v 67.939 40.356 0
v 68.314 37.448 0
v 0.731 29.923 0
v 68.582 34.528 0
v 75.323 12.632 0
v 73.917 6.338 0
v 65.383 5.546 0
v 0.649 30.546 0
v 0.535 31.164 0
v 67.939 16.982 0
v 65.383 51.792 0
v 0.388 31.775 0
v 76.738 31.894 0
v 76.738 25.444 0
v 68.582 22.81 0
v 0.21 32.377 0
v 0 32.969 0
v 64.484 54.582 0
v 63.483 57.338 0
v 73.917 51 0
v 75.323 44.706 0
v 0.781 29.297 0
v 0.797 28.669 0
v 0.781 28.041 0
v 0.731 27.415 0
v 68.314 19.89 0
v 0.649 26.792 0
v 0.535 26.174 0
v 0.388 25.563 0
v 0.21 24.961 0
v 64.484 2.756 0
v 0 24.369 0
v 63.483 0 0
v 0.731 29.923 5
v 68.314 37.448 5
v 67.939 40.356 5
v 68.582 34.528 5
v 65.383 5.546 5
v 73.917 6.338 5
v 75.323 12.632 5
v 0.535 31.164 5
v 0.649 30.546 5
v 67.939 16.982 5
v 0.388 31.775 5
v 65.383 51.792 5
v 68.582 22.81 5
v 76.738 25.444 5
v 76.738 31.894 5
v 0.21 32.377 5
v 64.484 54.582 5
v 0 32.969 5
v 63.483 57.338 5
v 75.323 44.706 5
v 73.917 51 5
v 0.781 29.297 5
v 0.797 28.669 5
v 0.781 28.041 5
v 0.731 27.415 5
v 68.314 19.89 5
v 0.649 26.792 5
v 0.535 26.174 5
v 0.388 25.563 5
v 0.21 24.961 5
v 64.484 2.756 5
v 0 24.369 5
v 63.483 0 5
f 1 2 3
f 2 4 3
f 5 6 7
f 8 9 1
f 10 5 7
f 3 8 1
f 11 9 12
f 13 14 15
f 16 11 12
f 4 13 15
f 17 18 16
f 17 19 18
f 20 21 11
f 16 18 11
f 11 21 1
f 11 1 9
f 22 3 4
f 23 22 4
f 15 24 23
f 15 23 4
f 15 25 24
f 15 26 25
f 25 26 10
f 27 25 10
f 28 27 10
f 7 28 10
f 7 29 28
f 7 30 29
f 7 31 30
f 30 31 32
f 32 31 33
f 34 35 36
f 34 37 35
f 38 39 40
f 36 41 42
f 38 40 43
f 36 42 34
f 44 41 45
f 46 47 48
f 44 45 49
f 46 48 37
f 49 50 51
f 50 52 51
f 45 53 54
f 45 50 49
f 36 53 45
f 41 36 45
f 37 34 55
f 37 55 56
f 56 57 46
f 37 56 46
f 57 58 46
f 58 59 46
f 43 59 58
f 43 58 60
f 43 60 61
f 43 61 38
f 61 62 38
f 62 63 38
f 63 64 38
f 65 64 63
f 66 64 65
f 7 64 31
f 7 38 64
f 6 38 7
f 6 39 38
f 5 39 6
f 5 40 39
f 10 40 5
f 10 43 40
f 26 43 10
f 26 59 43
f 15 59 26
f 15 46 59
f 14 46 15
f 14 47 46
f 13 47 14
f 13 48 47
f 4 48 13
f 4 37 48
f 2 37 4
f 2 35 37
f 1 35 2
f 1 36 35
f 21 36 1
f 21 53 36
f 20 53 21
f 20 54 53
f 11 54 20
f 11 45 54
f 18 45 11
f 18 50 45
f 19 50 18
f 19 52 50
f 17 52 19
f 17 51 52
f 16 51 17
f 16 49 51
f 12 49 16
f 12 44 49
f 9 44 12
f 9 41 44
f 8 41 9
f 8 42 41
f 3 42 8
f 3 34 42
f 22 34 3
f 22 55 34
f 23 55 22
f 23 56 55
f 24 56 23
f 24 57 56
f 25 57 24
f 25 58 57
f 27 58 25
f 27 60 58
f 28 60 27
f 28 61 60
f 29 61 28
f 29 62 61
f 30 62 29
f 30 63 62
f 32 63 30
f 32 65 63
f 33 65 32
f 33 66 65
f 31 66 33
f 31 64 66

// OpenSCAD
$fn = 32;

// ----------------------------------------------------------------------
// Gear sector: 3 teeth on 42 degrees
// ----------------------------------------------------------------------

// --- parameters (mm) ---
sector_angle = 42;        // sector angle, degrees
root_r = 80;              // root circle radius
tooth_h = 8;              // tooth height over the root circle
teeth = 3;                // number of teeth on the sector
hub_r = 12;               // hub bore radius
plate_t = 5;              // sector thickness, Z
arc_step = 3;             // sampling step of the root/hub arcs, degrees

tip_r = root_r + tooth_h;  // tip circle radius

profile = [[63.483, 0], [64.484, 2.756], [65.383, 5.546], [73.917, 6.338], [75.323, 12.632], [67.939, 16.982], [68.314, 19.89], [68.582, 22.81], [76.738, 25.444], [76.738, 31.894], [68.582, 34.528], [68.314, 37.448], [67.939, 40.356], [75.323, 44.706], [73.917, 51], [65.383, 51.792], [64.484, 54.582], [63.483, 57.338], [0, 32.969], [0.21, 32.377], [0.388, 31.775], [0.535, 31.164], [0.649, 30.546], [0.731, 29.923], [0.781, 29.297], [0.797, 28.669], [0.781, 28.041], [0.731, 27.415], [0.649, 26.792], [0.535, 26.174], [0.388, 25.563], [0.21, 24.961], [0, 24.369]];  // primary outline, 33 points, counter clockwise

// --- the one profile operation ---
linear_extrude(height = plate_t) polygon(points = profile);
